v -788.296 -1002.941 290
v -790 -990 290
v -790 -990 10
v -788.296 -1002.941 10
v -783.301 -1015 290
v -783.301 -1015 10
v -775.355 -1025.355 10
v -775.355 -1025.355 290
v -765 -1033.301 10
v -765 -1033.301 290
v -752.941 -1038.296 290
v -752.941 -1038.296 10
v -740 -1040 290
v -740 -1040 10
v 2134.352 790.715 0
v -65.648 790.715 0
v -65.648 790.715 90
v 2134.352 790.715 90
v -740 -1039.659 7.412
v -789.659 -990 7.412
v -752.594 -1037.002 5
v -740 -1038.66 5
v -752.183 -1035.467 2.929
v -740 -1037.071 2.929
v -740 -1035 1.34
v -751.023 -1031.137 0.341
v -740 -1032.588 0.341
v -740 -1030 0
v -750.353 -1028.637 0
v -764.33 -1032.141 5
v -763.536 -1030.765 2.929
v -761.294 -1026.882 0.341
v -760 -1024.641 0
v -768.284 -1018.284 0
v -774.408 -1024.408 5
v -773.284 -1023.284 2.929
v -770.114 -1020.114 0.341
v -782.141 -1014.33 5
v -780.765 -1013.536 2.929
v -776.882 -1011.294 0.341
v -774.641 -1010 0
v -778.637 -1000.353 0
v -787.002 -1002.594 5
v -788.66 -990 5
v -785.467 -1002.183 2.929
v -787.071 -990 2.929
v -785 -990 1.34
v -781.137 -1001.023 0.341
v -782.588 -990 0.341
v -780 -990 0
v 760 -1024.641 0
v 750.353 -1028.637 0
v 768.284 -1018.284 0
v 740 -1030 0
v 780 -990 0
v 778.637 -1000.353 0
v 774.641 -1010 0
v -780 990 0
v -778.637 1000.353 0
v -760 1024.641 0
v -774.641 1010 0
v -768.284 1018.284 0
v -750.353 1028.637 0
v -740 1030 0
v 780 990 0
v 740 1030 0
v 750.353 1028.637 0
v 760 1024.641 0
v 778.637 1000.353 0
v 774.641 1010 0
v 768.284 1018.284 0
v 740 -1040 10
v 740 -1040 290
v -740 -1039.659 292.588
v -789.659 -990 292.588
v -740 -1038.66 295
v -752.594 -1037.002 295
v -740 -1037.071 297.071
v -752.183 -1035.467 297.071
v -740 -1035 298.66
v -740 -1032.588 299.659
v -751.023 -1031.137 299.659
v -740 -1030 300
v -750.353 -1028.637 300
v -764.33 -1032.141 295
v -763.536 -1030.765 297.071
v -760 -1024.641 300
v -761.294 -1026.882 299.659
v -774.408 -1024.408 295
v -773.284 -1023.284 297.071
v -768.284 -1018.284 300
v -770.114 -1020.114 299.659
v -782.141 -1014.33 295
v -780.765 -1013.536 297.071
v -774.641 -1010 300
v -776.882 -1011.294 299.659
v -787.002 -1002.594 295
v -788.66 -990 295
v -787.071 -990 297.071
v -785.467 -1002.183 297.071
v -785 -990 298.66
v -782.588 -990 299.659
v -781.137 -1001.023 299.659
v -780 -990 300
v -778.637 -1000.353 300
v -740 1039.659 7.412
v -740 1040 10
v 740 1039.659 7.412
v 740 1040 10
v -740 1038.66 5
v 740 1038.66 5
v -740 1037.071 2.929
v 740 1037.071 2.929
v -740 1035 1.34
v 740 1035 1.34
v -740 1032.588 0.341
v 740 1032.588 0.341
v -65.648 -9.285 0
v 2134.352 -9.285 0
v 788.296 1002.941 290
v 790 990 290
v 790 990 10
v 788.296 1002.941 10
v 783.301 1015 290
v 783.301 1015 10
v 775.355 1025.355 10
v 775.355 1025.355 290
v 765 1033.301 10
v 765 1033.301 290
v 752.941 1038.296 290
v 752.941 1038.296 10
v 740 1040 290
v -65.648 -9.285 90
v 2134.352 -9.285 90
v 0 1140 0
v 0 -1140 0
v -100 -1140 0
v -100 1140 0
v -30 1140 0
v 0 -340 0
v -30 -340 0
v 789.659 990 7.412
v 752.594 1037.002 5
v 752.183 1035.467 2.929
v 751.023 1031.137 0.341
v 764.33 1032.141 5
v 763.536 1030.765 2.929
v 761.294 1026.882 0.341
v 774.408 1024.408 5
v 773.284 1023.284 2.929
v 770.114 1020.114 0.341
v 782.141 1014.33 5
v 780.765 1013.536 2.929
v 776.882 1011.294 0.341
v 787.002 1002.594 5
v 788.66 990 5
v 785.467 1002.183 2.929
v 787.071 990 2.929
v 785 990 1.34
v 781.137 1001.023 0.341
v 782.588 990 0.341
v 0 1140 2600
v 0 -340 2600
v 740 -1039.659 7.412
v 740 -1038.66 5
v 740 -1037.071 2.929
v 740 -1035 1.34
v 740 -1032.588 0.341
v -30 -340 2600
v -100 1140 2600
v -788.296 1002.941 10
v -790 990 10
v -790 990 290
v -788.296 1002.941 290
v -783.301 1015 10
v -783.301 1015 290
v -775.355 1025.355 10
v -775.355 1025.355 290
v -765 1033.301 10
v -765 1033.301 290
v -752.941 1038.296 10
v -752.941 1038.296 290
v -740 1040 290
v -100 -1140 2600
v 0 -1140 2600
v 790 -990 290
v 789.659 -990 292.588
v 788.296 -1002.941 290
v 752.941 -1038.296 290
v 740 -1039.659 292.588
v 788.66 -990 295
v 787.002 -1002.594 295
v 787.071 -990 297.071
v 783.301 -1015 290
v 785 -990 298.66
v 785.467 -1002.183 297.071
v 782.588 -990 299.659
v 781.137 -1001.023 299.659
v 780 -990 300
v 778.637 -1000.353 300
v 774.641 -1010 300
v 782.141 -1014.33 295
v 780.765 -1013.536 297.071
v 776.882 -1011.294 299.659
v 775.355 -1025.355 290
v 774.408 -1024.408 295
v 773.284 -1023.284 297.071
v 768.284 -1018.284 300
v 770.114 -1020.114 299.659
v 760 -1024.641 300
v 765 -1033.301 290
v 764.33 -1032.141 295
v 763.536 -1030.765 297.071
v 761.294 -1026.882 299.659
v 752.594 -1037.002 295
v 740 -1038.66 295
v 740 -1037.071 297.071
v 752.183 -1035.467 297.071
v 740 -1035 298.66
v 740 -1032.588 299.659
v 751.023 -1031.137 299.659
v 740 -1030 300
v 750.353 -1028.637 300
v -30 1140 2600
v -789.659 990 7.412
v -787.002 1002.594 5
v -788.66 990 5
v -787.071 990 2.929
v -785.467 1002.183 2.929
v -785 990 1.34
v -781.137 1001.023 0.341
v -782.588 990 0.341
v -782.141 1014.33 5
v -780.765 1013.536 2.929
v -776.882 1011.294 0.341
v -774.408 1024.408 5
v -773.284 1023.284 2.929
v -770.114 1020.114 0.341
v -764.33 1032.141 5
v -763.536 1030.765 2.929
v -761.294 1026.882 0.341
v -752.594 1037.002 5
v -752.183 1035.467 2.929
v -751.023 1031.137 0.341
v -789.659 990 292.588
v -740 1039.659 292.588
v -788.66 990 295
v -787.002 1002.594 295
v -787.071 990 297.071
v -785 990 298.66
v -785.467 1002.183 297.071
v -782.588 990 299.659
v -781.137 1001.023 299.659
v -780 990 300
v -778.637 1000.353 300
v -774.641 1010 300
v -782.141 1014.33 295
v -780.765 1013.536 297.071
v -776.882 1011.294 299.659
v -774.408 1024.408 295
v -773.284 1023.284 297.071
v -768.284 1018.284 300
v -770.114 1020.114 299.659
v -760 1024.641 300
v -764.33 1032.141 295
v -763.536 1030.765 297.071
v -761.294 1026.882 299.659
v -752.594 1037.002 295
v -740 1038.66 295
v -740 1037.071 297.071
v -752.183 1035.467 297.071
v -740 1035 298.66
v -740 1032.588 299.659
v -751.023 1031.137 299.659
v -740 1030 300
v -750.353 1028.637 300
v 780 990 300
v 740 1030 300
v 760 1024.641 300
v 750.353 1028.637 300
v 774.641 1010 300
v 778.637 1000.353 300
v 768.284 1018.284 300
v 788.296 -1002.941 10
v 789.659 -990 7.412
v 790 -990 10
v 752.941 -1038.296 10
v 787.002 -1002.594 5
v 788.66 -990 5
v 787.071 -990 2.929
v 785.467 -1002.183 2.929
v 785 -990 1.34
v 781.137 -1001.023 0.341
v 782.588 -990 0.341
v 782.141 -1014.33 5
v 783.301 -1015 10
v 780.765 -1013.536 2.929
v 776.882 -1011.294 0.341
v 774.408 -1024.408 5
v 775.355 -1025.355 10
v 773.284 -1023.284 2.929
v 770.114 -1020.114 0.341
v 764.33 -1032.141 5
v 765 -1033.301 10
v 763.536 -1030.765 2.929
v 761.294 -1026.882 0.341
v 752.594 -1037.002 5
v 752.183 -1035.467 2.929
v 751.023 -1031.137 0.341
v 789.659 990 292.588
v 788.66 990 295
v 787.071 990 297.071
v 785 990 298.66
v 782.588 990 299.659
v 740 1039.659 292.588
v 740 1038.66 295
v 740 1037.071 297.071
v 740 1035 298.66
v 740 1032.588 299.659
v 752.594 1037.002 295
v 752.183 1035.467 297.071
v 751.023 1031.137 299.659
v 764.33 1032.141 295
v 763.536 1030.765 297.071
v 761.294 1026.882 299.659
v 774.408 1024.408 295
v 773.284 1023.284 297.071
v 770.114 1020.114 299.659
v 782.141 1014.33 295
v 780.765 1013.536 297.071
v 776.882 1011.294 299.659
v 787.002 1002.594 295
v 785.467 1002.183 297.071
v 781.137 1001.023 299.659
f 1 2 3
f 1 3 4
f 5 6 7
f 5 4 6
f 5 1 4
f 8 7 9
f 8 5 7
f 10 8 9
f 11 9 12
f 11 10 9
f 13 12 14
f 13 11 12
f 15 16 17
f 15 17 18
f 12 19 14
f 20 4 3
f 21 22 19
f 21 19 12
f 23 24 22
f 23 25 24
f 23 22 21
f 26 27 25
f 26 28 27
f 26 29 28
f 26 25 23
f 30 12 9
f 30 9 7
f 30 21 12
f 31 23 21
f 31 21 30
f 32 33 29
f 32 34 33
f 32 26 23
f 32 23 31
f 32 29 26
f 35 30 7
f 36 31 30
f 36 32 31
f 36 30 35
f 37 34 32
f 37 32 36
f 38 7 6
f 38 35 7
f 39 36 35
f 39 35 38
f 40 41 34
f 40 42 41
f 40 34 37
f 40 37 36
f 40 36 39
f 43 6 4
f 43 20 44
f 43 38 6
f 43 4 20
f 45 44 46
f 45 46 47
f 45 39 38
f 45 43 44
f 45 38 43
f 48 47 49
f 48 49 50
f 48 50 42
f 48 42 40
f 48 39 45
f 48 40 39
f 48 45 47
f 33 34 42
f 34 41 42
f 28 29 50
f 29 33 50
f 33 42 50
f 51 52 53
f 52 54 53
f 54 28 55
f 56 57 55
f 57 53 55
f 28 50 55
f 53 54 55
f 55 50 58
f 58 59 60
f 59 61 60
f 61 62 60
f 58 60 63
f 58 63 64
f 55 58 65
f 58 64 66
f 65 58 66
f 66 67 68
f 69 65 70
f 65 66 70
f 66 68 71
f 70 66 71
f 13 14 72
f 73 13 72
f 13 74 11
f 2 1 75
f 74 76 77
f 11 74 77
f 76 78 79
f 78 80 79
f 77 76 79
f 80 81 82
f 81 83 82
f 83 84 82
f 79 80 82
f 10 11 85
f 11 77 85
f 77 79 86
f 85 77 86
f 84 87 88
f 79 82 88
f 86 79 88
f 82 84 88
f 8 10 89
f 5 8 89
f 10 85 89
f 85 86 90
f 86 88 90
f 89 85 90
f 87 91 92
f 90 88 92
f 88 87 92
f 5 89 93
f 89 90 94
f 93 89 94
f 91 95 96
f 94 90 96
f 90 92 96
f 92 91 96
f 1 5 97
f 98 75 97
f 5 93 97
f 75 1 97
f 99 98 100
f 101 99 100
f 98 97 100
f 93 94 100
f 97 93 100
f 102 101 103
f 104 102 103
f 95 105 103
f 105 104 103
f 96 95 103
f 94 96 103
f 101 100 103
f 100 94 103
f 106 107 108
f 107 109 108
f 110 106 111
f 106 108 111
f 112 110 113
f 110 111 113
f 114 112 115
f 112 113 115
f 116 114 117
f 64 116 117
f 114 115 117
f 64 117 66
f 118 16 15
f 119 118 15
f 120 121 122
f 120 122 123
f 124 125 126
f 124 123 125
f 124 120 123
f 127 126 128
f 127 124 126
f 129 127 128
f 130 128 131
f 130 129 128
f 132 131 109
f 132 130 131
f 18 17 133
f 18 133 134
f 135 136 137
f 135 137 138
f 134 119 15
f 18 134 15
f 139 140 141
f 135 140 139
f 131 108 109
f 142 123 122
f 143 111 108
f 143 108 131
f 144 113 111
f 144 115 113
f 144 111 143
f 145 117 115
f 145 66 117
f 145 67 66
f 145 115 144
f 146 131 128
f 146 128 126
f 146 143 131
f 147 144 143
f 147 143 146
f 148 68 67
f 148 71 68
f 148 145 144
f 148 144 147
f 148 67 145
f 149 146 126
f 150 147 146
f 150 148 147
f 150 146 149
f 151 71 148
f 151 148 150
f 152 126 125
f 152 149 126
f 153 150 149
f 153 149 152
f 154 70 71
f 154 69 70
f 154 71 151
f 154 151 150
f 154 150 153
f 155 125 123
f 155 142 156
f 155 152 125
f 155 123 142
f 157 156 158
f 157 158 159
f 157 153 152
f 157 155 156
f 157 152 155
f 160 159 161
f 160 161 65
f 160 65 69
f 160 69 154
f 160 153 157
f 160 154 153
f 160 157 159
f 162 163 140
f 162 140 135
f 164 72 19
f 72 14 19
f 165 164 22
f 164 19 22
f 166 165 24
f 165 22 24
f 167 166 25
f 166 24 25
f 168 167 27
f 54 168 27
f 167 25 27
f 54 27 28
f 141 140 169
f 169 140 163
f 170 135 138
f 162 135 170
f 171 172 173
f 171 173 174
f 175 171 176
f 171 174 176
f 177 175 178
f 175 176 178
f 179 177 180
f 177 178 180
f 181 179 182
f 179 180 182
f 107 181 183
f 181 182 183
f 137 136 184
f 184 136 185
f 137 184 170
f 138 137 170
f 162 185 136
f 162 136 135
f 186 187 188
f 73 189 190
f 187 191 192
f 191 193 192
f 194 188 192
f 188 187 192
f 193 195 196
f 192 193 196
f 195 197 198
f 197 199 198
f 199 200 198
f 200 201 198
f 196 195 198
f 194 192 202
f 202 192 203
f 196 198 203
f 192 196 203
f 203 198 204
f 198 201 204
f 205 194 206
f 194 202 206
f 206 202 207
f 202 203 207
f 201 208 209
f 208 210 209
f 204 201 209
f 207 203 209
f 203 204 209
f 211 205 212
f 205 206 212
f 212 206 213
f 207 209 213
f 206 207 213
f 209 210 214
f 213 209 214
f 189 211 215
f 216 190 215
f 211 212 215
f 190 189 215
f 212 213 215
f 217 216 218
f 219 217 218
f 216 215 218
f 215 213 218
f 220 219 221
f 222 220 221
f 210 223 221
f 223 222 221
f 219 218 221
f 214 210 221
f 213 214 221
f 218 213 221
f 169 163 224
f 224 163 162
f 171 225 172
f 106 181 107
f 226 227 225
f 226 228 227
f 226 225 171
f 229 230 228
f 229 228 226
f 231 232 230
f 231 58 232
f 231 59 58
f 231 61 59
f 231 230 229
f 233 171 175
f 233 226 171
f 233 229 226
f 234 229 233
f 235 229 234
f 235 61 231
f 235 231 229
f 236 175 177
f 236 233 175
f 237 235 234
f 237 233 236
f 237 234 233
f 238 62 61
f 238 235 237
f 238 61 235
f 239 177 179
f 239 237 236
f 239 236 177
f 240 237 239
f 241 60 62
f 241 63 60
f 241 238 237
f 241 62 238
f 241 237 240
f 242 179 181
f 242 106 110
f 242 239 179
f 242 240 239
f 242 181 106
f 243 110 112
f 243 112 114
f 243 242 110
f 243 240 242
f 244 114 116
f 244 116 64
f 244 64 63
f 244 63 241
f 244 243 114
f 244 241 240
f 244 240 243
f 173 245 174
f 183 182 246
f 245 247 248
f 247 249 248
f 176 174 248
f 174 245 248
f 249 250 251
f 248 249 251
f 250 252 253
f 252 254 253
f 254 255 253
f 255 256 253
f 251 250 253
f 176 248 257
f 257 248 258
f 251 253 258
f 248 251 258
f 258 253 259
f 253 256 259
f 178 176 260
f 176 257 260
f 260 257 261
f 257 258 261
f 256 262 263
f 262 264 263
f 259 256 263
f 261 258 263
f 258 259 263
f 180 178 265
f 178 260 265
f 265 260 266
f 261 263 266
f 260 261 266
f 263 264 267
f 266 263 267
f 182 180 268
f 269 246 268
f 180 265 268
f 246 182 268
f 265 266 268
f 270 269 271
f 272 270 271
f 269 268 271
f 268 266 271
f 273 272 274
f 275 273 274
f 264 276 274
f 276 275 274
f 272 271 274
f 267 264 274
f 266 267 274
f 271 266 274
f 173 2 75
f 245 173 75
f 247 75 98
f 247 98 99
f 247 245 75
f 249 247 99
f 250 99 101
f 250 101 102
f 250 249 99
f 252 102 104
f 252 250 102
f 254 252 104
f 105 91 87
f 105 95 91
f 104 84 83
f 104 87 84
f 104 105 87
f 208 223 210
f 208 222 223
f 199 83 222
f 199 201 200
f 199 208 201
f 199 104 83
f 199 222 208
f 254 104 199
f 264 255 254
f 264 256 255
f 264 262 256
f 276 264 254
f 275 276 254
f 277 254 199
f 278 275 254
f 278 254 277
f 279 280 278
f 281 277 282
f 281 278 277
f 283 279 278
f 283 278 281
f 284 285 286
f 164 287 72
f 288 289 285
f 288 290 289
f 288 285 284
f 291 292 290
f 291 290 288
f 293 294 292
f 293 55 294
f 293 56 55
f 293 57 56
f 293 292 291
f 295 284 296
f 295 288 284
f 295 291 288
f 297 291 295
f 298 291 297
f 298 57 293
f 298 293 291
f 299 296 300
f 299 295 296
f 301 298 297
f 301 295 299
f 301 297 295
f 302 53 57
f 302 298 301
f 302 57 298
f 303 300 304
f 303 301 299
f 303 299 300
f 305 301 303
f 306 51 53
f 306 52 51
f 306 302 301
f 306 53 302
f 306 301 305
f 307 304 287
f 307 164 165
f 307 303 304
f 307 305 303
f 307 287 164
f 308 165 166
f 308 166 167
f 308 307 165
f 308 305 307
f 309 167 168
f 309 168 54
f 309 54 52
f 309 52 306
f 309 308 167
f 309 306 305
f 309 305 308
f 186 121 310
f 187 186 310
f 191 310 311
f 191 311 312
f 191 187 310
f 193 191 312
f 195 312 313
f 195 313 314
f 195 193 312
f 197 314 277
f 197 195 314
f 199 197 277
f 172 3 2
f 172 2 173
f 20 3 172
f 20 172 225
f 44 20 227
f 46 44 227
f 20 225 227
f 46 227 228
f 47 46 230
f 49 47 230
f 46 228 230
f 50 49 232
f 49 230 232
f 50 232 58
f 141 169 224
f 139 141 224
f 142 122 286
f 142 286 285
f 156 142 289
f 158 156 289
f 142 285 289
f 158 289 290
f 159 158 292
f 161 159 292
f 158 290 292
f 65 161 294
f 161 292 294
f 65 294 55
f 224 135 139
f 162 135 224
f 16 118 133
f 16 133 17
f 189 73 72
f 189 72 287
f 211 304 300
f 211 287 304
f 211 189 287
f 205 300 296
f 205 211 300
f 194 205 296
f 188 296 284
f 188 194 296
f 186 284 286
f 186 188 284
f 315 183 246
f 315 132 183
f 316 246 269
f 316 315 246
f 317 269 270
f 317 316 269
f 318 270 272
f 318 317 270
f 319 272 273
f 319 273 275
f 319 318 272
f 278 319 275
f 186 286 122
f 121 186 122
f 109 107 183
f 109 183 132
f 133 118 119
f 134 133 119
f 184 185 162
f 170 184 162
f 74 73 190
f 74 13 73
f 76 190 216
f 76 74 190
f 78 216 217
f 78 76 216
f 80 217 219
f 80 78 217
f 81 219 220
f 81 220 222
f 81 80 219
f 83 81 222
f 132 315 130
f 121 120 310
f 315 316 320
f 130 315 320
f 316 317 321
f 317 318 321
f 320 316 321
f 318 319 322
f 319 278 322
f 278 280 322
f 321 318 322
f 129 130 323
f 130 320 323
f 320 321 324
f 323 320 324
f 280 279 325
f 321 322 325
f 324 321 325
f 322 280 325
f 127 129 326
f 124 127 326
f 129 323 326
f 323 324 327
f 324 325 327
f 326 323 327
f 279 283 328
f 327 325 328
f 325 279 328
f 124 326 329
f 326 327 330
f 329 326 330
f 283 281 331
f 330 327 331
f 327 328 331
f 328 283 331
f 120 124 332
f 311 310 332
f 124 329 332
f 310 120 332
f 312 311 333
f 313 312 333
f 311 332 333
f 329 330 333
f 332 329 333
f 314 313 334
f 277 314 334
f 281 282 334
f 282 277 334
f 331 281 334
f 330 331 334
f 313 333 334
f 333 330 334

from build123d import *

# Parameters (mm, degrees)
F0_W     = 1580
F0_H     = 2080
F1_DEPTH = 300
F2_R     = 50
F3_R     = 10
F4_W     = 2200
F4_H     = 800
F5_DEPTH = 90
F6_W     = 2280
F6_H     = 2600
F7_DEPTH = 100
F8_W     = 1480
F8_H     = 2600
F9_DEPTH = 30


with BuildPart() as f1:
    # F0 (on Top) → F1 (new body)
    with BuildSketch(Plane.XY):
        Rectangle(F0_W, F0_H)
    extrude(amount=F1_DEPTH)

    # F2
    f2_edges = [f1.edges().sort_by_distance(p)[0] for p in [
        (-790, 1040, 150),
        (-790, -1040, 150),
        (790, -1040, 150),
        (790, 1040, 150),
    ]]
    fillet(f2_edges, radius=F2_R)

    # F3
    f3_edges = [f1.edges().sort_by_distance(p)[0] for p in [
        (-790, 0, 300),
        (-790, 0, 0),
    ]]
    fillet(f3_edges, radius=F3_R)


with BuildPart() as f5:
    # F4 (on Top) → F5 (new body)
    with BuildSketch(Plane.XY):
        with Locations((1034.351802, 390.71501)):
            Rectangle(F4_W, F4_H)
    extrude(amount=F5_DEPTH)


with BuildPart() as f7:
    # F6 (on Right) → F7 (new body)
    with BuildSketch(Plane.YZ):
        with Locations((0, 1300)):
            Rectangle(F6_W, F6_H)
    extrude(amount=-F7_DEPTH)


with BuildPart() as f9:
    # F8 (on Right) → F9 (new body)
    with BuildSketch(Plane.YZ):
        with Locations((400, 1300)):
            Rectangle(F8_W, F8_H)
    extrude(amount=-F9_DEPTH)


solid = Compound([f1.part, f5.part, f7.part, f9.part])
